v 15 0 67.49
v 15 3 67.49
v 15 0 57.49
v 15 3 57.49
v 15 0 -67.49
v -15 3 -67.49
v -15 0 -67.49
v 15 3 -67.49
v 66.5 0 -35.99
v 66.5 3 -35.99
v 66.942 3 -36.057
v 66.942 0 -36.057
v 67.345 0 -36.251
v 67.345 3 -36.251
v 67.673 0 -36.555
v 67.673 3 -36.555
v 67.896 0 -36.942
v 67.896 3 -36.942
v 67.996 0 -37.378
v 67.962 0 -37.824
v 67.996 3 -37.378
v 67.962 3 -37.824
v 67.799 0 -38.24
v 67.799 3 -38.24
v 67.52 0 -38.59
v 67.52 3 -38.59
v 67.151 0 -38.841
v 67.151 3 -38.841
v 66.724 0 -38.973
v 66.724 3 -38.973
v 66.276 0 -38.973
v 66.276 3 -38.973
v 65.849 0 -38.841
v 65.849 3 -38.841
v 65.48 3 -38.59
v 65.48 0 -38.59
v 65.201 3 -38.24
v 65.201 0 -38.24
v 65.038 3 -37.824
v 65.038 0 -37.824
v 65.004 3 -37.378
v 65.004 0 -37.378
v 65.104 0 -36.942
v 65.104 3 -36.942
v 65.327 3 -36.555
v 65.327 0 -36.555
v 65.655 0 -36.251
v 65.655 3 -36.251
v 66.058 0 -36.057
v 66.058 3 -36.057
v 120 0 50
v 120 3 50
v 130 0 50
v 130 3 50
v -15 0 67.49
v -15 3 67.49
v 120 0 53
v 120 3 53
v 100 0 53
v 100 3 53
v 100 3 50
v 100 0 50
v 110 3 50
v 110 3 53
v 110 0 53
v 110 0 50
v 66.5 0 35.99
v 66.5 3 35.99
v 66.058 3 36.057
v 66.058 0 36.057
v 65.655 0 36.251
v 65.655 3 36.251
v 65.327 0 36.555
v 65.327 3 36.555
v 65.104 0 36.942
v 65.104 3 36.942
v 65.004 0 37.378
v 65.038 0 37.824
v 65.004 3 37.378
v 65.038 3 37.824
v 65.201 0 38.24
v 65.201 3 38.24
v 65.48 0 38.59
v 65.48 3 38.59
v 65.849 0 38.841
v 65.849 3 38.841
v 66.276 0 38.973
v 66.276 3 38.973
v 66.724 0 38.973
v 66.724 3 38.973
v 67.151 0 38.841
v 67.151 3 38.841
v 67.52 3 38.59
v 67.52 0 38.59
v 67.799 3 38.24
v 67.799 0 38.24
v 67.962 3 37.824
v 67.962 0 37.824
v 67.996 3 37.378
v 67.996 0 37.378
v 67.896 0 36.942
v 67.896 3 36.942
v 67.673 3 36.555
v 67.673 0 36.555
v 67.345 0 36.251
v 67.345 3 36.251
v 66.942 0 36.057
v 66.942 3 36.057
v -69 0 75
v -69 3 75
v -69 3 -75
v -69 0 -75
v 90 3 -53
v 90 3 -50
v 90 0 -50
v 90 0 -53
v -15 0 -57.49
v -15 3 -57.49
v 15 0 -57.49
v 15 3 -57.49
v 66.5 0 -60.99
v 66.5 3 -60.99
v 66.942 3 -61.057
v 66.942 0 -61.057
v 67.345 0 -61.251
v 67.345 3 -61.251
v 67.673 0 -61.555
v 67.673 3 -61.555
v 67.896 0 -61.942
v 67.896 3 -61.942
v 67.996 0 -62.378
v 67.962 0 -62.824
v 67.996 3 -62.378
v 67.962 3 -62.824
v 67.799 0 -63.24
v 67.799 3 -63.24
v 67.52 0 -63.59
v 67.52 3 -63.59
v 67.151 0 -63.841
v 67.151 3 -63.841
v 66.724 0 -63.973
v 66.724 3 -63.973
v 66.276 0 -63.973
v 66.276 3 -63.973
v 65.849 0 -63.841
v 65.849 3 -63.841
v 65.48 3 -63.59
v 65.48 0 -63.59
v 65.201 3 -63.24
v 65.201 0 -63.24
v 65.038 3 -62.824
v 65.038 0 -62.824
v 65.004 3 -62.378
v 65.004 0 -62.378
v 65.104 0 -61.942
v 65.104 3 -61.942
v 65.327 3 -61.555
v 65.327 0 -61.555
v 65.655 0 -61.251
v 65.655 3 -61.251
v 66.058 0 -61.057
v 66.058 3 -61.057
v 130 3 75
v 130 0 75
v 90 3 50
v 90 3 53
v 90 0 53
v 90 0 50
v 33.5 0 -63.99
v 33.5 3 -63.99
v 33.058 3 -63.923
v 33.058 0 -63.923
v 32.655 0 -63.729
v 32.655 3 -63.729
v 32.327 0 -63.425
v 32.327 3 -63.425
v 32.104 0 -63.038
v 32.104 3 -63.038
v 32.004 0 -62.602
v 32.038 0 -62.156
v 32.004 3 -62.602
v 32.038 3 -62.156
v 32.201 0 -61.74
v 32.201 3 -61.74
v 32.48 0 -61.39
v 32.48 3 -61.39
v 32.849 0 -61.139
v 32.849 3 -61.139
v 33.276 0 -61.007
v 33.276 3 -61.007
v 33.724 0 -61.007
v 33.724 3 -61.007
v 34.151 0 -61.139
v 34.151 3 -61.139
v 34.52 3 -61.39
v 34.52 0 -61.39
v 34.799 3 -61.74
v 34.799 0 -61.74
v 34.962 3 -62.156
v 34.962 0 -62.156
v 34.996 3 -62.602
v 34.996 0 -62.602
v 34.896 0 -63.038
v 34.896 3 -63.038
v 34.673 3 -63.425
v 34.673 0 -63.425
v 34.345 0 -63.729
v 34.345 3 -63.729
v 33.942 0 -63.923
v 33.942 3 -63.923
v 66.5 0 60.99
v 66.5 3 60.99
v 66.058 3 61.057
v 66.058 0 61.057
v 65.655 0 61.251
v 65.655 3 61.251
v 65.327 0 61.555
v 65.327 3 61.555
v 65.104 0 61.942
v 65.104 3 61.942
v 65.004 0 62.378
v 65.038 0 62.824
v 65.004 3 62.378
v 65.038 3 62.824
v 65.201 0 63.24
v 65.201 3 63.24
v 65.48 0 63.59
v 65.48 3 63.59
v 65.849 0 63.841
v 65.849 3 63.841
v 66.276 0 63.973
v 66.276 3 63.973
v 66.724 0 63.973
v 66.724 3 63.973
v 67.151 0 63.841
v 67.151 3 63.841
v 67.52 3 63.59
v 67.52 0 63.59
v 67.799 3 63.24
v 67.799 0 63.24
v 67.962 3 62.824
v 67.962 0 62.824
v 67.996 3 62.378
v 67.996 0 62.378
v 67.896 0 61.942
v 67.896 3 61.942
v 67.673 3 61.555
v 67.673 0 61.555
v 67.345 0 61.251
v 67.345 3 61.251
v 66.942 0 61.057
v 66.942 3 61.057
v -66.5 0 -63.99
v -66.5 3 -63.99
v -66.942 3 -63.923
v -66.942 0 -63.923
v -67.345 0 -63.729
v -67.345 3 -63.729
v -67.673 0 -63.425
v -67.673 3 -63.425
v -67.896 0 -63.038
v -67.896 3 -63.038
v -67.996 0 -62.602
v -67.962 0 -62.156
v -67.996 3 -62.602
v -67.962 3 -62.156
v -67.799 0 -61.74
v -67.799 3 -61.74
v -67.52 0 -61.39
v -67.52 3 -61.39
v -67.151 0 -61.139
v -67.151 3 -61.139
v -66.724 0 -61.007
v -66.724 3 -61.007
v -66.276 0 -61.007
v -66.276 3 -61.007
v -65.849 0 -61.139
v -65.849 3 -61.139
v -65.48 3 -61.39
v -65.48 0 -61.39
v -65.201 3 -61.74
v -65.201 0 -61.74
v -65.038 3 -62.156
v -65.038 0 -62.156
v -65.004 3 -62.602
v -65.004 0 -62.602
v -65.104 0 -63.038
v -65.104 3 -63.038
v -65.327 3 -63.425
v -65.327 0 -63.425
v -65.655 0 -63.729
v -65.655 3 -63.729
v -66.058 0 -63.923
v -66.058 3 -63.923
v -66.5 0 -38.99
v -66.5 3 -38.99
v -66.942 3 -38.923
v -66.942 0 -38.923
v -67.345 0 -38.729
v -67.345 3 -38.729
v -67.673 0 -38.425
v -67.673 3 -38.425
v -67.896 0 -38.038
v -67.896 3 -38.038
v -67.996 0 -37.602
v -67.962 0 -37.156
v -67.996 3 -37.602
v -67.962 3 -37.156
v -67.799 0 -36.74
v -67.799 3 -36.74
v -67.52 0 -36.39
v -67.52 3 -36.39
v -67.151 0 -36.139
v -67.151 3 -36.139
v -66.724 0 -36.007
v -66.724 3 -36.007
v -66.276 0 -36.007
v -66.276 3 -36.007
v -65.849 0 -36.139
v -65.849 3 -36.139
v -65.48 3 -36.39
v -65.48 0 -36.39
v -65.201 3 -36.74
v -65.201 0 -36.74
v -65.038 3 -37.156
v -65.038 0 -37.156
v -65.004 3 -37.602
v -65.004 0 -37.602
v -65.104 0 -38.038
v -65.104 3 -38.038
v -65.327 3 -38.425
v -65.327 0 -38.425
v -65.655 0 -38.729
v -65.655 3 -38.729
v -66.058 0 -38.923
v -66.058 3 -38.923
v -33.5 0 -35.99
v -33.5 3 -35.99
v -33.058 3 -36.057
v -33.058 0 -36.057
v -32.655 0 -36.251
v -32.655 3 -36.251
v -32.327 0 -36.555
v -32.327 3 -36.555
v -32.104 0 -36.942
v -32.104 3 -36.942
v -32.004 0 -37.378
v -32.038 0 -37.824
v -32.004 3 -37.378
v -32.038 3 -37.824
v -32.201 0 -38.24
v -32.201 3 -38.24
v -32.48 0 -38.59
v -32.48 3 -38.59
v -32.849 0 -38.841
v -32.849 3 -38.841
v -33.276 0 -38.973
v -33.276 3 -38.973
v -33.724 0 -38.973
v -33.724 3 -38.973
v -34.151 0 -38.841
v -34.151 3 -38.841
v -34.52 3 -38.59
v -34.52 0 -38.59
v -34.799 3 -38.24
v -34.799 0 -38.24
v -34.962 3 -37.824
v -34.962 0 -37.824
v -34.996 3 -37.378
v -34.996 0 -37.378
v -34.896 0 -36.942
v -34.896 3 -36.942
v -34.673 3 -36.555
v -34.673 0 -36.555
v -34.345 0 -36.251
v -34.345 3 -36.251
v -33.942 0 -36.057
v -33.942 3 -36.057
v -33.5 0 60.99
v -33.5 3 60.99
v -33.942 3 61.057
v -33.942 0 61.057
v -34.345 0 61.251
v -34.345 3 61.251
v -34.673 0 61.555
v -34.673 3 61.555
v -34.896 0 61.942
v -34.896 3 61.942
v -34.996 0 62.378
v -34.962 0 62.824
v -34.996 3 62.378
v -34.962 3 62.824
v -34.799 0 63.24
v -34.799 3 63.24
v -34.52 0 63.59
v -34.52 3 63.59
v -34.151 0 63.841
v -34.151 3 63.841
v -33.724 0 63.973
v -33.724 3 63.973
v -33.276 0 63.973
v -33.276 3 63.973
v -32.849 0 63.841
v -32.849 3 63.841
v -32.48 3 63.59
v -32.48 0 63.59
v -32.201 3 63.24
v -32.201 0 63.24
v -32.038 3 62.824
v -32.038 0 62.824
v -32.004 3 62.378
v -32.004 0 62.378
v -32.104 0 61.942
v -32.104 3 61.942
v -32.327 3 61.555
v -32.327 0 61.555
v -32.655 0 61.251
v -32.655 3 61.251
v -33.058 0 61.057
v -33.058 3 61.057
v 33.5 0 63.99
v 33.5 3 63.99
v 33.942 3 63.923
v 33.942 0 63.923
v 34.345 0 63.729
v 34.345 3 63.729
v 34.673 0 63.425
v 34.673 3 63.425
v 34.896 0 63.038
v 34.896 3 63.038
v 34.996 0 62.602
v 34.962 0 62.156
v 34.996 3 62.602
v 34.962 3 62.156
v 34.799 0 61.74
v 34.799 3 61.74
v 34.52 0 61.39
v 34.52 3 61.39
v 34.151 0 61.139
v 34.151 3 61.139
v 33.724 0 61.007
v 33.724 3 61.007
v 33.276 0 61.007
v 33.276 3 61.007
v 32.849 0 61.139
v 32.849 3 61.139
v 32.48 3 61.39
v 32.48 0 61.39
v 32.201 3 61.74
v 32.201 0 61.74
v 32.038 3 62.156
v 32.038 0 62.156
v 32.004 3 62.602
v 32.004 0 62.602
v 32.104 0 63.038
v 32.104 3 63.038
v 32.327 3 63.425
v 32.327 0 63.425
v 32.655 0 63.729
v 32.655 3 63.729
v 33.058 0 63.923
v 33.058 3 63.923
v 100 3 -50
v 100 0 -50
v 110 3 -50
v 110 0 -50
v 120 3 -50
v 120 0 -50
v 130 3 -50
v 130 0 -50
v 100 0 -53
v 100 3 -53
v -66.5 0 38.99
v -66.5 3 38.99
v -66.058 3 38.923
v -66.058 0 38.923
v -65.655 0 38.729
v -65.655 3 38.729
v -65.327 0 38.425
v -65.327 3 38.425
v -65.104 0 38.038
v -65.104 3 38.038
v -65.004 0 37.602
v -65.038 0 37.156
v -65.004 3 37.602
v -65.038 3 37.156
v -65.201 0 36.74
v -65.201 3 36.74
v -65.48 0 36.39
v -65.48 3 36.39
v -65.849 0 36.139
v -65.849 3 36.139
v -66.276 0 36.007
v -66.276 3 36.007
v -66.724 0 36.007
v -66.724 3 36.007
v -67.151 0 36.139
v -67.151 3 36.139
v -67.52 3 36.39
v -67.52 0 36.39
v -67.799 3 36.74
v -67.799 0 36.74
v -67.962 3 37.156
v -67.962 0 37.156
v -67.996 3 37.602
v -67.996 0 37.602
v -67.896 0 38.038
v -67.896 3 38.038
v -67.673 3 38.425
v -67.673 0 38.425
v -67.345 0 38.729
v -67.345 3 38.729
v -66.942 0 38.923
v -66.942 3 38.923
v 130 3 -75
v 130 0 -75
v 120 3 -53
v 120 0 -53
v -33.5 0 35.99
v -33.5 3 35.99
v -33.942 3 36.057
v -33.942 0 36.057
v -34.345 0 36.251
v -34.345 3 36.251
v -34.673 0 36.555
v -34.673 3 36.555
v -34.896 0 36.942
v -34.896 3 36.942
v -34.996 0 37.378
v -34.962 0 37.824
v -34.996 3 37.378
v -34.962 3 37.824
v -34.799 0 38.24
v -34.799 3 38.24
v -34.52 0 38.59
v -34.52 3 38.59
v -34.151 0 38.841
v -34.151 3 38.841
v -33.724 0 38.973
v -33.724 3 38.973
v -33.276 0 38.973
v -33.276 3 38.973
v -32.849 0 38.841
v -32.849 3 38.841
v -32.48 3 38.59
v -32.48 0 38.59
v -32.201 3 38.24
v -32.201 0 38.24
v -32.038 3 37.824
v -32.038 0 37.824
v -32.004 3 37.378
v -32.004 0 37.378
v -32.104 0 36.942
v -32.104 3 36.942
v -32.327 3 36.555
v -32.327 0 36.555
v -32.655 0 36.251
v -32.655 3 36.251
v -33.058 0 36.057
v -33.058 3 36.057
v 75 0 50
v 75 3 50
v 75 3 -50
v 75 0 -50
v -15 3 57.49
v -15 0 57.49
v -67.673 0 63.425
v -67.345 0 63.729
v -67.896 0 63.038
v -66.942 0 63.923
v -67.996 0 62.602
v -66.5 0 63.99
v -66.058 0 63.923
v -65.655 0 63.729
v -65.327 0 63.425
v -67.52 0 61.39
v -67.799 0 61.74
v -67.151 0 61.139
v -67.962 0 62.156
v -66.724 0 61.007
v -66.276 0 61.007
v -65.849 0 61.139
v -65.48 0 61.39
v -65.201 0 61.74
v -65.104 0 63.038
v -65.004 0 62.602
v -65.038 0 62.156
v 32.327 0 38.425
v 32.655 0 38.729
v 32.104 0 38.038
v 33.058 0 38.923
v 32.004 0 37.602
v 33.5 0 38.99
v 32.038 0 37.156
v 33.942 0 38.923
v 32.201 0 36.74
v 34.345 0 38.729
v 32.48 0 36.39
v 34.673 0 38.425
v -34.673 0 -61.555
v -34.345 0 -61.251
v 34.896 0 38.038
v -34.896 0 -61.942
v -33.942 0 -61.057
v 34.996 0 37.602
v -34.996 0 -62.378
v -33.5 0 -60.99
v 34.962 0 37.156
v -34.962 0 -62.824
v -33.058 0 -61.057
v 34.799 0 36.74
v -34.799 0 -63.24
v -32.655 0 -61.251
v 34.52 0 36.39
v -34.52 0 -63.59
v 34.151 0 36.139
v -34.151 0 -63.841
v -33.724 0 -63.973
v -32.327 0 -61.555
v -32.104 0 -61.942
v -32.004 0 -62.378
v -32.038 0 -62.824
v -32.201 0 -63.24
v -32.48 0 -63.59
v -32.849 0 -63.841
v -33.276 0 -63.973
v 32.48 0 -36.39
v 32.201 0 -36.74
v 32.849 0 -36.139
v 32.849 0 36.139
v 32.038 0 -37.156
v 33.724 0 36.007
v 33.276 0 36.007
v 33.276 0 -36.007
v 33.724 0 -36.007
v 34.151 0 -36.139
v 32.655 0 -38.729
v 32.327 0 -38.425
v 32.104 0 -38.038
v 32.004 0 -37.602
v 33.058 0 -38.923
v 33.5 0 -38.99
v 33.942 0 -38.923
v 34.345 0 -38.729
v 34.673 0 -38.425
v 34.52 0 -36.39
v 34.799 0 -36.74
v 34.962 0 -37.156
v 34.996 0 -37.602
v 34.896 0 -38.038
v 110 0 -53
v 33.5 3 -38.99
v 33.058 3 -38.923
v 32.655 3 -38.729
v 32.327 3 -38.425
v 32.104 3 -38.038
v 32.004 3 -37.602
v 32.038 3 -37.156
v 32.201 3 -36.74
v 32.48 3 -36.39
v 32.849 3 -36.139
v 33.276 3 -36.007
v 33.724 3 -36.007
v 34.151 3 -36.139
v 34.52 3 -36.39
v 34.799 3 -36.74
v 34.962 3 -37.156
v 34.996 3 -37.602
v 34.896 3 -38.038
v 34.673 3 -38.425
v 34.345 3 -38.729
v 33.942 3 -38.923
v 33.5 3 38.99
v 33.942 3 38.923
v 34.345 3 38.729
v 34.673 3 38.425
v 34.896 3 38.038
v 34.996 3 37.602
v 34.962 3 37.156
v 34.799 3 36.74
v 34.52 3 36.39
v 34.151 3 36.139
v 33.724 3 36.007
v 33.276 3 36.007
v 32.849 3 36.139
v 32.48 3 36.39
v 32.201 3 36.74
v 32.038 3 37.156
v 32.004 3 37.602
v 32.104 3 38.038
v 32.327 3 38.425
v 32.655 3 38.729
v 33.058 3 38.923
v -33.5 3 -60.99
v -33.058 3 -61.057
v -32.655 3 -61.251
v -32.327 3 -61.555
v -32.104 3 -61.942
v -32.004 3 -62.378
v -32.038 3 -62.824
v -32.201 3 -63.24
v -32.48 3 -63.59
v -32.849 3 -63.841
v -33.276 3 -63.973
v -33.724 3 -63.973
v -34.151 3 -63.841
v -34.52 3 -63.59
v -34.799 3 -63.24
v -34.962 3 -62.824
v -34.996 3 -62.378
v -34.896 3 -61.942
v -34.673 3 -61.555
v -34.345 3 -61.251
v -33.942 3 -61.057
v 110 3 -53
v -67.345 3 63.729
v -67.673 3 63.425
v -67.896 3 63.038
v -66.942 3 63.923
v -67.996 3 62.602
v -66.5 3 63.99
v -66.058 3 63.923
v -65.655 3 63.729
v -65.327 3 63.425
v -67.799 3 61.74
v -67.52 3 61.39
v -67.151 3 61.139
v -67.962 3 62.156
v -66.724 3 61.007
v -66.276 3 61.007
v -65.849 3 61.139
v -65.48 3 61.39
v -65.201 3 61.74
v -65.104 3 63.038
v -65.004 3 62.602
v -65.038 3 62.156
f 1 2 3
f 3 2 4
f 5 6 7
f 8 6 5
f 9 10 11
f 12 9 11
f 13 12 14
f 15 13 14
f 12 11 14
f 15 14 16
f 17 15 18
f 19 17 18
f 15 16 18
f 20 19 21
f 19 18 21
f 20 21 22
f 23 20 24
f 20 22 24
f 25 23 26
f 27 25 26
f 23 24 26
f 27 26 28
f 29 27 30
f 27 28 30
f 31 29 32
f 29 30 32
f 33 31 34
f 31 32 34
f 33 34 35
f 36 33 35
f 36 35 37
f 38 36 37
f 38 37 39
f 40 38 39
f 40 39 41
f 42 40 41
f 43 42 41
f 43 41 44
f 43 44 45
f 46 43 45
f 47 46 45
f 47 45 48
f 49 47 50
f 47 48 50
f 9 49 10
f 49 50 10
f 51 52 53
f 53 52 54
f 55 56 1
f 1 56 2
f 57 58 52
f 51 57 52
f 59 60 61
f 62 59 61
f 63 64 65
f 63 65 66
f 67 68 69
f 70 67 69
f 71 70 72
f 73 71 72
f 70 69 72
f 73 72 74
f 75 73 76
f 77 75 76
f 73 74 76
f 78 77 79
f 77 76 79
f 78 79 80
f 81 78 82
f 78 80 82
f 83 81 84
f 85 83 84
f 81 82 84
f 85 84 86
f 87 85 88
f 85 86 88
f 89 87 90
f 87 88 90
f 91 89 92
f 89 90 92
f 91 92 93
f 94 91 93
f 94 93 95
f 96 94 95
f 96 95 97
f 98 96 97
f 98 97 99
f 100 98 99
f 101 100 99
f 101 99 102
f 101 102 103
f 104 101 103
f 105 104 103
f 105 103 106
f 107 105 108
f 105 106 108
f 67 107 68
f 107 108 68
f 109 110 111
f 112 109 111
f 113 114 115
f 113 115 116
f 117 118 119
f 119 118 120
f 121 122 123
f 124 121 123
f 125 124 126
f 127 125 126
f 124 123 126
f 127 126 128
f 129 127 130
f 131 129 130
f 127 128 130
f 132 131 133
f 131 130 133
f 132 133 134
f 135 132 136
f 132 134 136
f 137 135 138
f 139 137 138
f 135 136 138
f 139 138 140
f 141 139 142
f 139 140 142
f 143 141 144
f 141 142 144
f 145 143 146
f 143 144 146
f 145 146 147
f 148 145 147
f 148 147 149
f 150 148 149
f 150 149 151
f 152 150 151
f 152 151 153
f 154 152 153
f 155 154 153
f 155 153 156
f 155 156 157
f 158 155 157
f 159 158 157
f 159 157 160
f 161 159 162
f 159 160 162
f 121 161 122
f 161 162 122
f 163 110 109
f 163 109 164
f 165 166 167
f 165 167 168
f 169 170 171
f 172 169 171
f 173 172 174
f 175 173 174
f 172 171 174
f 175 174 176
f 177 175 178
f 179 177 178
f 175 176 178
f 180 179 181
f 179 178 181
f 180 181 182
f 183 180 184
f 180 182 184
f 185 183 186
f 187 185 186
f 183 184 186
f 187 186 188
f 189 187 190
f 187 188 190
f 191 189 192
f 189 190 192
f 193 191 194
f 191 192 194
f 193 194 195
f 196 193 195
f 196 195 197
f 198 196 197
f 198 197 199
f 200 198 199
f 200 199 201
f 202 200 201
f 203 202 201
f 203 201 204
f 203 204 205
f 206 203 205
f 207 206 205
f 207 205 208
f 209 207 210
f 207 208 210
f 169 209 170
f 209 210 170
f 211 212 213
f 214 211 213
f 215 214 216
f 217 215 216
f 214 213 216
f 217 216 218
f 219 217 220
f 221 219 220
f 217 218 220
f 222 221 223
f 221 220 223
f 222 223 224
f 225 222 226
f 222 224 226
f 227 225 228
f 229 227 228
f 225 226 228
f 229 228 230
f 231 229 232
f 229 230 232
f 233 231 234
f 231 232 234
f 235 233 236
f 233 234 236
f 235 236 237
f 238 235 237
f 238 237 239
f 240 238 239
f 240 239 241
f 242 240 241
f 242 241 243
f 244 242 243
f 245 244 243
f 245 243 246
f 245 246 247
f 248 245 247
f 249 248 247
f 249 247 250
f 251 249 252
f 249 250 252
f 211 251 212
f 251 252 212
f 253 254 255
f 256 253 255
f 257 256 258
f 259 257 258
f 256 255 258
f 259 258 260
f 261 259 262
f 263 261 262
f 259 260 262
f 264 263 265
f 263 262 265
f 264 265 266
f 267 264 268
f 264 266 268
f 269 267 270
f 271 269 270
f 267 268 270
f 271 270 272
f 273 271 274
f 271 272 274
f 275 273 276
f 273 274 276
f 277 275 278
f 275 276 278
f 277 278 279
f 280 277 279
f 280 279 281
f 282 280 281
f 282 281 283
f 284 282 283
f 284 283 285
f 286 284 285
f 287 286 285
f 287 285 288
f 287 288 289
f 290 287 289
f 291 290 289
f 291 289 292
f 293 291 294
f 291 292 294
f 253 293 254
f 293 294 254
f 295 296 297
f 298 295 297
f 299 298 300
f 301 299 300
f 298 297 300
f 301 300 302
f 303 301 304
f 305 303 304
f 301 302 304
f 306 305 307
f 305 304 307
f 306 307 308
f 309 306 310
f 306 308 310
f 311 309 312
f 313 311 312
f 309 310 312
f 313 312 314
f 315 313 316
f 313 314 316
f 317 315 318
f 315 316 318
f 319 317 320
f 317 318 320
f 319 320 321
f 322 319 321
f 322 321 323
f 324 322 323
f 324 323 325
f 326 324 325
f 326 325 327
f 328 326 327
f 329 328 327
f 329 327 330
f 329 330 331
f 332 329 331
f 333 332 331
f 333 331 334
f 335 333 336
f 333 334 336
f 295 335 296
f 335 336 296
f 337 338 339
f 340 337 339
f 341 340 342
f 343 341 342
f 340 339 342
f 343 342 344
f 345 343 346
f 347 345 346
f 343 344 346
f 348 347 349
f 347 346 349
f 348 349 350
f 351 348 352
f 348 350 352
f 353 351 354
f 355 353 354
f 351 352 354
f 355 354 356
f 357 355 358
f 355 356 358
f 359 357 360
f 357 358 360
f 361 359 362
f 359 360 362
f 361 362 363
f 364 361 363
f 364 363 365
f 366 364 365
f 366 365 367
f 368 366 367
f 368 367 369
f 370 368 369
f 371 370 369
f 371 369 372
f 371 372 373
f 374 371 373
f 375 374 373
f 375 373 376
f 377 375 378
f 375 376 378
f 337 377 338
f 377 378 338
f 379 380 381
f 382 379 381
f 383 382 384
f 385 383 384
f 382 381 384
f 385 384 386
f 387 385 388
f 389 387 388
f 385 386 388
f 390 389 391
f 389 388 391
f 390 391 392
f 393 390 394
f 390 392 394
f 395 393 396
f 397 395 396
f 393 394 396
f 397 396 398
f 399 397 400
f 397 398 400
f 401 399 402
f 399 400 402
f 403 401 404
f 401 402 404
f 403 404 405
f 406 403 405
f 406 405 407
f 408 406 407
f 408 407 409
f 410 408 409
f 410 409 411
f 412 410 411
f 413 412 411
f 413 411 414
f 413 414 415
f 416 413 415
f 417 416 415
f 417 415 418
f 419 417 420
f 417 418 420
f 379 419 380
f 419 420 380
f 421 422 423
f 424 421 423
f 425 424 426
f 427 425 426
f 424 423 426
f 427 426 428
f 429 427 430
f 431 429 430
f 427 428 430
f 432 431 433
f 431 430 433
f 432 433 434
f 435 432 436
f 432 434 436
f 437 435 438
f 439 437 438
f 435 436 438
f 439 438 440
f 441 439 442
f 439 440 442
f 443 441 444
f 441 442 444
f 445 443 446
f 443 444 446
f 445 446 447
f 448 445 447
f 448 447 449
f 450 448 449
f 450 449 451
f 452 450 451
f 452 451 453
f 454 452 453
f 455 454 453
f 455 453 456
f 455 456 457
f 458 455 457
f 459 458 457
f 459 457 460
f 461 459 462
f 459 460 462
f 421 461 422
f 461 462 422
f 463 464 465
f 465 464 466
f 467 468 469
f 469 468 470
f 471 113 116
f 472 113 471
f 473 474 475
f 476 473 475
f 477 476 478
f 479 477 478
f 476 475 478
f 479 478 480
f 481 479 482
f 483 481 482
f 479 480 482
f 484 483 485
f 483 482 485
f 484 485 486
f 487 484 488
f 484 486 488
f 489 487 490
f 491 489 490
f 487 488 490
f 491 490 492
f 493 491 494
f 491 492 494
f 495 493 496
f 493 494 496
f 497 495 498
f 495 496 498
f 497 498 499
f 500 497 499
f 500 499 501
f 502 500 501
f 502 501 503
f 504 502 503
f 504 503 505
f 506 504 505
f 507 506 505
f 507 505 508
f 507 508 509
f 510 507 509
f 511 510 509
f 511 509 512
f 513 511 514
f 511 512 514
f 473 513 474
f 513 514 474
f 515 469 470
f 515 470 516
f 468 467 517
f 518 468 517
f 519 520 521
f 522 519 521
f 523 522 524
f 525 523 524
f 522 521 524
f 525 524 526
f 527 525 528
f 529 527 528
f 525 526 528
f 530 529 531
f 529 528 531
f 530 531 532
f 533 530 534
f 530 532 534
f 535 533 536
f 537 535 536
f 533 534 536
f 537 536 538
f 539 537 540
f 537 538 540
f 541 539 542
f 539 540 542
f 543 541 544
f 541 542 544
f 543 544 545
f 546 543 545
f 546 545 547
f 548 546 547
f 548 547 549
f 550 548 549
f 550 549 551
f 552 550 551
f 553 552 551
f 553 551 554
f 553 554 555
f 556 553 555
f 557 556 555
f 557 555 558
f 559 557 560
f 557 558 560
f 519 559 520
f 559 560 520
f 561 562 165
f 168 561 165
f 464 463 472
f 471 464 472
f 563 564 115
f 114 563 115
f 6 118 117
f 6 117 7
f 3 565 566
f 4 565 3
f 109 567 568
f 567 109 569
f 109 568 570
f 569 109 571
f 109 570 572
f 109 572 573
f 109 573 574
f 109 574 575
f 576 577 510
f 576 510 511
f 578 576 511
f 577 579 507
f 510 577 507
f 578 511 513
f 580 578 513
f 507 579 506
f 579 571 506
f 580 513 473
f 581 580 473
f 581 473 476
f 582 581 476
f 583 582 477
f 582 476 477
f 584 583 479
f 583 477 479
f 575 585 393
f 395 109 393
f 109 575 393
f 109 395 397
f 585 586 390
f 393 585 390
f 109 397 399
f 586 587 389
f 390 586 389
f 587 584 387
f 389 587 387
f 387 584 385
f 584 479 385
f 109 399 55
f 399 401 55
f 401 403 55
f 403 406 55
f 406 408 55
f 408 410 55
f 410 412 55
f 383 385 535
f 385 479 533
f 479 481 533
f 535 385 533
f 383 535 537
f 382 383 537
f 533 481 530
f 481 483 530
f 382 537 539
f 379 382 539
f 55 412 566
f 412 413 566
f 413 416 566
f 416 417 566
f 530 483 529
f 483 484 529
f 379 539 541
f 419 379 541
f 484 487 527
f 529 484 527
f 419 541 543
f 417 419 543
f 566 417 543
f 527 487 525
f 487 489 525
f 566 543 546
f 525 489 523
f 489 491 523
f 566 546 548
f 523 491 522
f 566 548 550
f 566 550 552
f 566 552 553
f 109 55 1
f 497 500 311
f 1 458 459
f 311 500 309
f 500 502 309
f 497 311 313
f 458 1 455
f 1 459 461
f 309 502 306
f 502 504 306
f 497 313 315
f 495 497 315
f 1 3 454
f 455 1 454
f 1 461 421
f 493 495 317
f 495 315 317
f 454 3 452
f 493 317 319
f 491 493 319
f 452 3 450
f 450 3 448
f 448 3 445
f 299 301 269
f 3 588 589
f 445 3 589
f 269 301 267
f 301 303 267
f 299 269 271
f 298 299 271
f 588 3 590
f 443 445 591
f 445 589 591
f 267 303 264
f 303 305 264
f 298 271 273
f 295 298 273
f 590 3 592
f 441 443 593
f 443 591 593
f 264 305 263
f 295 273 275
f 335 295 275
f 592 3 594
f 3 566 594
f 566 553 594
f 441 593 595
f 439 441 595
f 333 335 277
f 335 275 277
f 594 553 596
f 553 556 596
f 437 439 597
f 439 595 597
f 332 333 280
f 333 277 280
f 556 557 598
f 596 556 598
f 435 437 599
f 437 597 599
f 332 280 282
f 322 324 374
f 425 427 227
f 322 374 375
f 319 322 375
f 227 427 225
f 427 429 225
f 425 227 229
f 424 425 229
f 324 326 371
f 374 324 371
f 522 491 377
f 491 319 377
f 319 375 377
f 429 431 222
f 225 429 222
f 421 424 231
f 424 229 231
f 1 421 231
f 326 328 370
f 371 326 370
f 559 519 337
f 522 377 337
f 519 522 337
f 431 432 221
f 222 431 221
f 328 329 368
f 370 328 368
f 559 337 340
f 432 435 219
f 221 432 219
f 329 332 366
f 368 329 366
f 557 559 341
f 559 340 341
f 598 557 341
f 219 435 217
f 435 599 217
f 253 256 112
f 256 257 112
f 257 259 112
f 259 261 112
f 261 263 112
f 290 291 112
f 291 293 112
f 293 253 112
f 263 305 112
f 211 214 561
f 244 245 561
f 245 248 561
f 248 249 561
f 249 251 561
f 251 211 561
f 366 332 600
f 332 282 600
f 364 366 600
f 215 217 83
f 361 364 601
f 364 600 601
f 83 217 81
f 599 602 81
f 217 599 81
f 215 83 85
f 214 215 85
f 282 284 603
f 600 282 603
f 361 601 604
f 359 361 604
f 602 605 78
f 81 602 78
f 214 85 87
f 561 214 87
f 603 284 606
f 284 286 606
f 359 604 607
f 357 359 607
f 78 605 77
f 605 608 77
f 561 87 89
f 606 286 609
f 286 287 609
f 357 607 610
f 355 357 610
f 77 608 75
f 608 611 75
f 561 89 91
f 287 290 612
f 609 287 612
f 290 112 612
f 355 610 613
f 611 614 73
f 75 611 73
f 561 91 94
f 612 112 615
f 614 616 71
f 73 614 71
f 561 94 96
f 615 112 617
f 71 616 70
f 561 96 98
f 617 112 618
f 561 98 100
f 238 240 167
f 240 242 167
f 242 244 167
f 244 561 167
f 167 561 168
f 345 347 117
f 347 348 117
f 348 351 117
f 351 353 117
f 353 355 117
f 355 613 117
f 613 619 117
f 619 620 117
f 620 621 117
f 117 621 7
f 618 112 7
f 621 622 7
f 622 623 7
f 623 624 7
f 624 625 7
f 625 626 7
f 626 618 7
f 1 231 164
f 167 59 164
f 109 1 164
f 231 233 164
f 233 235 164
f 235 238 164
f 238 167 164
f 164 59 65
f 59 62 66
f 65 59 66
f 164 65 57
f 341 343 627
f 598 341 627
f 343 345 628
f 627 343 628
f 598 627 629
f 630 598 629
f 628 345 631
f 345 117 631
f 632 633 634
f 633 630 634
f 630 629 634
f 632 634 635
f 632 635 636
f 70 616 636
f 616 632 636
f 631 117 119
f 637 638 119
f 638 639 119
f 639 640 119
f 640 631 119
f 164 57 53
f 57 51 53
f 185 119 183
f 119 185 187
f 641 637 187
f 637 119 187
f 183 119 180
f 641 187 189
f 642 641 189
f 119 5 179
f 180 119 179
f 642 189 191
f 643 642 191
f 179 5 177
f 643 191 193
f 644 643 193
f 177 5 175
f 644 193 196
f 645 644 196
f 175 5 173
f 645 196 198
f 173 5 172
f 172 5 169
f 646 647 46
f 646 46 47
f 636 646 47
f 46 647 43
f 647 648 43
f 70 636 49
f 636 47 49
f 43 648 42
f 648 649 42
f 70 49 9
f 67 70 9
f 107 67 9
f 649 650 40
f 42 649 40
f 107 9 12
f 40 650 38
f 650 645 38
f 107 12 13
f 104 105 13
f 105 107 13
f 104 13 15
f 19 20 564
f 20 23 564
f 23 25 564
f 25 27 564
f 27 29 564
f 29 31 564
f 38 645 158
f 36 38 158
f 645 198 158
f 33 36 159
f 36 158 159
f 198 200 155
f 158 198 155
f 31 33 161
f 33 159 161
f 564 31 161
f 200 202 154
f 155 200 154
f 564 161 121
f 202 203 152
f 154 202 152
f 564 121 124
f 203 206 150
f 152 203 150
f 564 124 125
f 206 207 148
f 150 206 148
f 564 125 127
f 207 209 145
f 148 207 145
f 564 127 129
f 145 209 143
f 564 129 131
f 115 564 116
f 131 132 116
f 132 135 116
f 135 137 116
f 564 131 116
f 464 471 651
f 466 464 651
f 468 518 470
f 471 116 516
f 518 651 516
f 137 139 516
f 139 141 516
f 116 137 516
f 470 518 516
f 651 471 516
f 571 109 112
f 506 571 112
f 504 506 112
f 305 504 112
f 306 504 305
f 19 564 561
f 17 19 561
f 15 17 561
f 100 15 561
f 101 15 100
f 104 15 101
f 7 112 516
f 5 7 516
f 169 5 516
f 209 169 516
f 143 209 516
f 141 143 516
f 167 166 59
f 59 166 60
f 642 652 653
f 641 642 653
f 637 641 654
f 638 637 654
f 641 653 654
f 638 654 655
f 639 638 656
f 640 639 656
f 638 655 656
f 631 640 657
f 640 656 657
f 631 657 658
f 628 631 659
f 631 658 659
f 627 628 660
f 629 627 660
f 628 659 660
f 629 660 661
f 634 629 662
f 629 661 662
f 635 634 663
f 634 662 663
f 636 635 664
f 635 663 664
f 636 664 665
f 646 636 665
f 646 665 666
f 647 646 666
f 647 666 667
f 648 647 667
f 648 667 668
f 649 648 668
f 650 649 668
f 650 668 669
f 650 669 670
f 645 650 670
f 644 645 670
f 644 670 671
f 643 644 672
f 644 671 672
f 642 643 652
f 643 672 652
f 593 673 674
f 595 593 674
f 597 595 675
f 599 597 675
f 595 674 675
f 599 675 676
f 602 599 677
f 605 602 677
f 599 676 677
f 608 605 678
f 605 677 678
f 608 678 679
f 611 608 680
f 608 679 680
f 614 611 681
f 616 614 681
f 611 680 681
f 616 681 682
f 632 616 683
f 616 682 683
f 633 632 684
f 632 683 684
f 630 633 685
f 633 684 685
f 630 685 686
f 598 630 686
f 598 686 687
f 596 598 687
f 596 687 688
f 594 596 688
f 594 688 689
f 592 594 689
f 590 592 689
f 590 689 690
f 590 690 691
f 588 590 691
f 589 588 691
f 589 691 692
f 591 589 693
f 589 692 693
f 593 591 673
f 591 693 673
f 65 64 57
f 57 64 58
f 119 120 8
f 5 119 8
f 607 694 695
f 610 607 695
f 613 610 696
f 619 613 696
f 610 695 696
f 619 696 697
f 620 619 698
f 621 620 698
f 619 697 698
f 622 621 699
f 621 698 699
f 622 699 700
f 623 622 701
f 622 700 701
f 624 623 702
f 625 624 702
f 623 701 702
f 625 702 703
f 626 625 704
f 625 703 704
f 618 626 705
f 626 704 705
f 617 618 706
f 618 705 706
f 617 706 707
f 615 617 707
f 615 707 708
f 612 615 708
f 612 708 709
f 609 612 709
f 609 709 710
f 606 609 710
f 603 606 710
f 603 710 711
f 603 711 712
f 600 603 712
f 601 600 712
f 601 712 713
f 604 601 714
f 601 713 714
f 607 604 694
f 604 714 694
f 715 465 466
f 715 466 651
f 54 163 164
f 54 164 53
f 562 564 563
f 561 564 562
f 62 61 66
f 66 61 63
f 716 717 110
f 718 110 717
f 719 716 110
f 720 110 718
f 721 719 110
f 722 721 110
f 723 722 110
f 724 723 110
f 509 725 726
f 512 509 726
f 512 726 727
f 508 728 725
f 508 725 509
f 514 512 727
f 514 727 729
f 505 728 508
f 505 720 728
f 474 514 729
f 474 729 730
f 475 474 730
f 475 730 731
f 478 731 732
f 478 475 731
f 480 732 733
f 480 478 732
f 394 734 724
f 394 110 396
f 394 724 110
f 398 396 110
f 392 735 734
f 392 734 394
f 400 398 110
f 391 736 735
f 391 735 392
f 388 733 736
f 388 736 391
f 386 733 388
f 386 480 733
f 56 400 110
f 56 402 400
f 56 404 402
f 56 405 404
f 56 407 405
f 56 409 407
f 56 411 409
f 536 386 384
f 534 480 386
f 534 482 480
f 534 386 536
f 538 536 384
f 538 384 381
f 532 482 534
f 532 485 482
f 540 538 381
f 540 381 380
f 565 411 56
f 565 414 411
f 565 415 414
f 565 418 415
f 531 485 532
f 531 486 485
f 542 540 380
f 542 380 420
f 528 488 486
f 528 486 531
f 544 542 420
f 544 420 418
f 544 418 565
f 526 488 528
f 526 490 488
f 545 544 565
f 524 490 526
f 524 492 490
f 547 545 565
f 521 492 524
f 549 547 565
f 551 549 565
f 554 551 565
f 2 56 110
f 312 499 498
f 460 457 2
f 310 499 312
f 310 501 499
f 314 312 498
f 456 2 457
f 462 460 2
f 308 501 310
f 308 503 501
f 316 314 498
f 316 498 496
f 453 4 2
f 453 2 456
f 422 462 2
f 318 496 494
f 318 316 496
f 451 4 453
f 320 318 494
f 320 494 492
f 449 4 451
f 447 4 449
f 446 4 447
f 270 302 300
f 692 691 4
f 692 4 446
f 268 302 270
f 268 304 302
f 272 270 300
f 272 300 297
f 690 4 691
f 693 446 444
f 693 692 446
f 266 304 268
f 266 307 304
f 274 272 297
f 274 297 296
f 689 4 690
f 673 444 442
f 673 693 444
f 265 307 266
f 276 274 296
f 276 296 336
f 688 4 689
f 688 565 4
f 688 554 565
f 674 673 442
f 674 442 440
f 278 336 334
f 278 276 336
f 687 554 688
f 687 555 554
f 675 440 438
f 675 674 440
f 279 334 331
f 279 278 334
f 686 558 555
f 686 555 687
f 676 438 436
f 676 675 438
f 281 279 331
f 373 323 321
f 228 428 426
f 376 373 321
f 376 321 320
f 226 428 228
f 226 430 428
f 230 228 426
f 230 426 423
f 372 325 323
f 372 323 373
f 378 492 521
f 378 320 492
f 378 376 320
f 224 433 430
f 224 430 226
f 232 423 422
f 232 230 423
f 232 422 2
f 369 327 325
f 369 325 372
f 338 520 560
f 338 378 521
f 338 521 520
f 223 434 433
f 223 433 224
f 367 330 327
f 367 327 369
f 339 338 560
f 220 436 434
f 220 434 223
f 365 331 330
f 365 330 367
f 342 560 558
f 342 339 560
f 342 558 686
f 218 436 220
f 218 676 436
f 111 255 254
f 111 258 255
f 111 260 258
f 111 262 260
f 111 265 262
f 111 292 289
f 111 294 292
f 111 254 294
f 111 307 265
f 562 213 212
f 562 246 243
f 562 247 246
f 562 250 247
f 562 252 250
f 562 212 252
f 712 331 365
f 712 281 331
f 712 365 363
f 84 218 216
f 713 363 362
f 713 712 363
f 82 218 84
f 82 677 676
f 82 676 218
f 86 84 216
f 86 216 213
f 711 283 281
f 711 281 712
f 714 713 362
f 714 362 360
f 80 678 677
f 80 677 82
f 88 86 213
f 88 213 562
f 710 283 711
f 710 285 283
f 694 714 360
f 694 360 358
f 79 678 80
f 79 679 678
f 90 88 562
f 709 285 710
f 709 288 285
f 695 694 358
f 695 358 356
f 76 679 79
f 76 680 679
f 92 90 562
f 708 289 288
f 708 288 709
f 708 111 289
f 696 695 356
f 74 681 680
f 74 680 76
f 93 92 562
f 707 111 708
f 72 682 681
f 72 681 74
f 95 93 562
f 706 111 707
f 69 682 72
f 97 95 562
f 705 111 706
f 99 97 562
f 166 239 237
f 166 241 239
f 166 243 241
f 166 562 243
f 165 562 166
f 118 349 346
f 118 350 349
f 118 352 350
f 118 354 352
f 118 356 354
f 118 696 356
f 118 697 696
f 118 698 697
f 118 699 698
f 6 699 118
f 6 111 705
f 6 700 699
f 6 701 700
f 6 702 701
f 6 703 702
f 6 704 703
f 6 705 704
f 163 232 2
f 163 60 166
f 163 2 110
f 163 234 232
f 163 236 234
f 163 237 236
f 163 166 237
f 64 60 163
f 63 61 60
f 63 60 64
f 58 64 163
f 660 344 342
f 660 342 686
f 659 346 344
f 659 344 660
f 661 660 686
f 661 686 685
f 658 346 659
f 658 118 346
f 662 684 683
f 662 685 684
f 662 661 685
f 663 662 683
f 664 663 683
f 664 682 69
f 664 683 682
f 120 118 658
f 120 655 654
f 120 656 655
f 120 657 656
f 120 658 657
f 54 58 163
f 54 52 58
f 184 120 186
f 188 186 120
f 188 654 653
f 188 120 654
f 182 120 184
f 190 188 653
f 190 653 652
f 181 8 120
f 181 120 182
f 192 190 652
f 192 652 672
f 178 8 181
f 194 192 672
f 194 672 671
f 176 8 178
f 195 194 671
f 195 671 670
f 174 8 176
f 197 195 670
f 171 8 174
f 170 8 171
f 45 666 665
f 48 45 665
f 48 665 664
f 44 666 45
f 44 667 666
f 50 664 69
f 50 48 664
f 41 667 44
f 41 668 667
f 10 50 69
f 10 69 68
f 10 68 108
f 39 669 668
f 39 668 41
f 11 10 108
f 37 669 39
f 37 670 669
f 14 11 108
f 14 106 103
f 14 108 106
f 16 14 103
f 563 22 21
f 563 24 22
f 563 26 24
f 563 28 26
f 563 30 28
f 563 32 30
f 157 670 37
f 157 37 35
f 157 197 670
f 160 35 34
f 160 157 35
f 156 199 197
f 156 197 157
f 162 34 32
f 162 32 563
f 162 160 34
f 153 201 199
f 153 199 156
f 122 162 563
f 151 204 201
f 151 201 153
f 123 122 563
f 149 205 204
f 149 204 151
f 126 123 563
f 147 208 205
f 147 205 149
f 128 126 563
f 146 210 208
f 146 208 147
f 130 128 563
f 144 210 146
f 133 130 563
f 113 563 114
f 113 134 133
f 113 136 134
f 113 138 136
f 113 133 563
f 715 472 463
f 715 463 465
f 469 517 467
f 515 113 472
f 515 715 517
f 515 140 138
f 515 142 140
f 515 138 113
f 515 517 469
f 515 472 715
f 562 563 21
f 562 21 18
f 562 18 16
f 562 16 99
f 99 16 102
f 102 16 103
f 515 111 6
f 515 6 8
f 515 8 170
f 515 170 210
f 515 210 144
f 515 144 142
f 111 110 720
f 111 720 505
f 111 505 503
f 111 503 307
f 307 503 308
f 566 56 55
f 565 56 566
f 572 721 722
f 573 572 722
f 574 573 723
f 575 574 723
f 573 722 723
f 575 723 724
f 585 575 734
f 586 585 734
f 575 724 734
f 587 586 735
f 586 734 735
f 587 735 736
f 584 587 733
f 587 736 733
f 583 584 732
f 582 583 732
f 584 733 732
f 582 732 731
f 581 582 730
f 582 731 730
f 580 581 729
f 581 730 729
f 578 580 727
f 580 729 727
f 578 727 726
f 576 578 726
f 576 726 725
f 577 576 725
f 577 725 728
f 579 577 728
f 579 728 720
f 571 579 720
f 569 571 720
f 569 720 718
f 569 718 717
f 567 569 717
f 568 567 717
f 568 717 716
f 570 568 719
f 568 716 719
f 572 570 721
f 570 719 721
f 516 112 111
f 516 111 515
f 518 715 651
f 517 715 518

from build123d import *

# Parameters (mm, degrees)
SKETCH2_W           = 180
SKETCH2_H           = 150
BOSS_EXTRUDE1_DEPTH = 3
SKETCH4_R           = 1.5
CUT_EXTRUDE1_DEPTH  = 3
SKETCH5_W           = 30
SKETCH5_H           = 100
CUT_EXTRUDE2_DEPTH  = 3
SKETCH7_W           = 40
SKETCH7_H           = 25
BOSS_EXTRUDE4_DEPTH = 3
SKETCH8_W           = 10
SKETCH8_H           = 3
CUT_EXTRUDE4_DEPTH  = 10
SKETCH9_W           = 21
SKETCH9_H           = 150
CUT_EXTRUDE5_DEPTH  = 10
SKETCH10_W          = 30
SKETCH10_H          = 10
CUT_EXTRUDE6_DEPTH  = 10


with BuildPart() as part:
    # Sketch2 → Boss-Extrude1 (new body)
    with BuildSketch(Plane(origin=(0, 0, 0), x_dir=(1, 0, 0), z_dir=(0, 1, 0))):
        Rectangle(SKETCH2_W, SKETCH2_H)
    extrude(amount=BOSS_EXTRUDE1_DEPTH)

    # Sketch4 → Cut-Extrude1 (cut)
    with BuildSketch(Plane(origin=(0, 3, 0), x_dir=(1, 0, 0), z_dir=(0, 1, 0))):
        with Locations(Location((-66.5, -62.49, 0), (0, 0, 270))):
            Circle(SKETCH4_R)
        with Locations(Location((-66.5, -37.49, 0), (0, 0, 270))):
            Circle(SKETCH4_R)
        with Locations(Location((-33.5, -62.49, 0), (0, 0, 90))):
            Circle(SKETCH4_R)
        with Locations(Location((-33.5, -37.49, 0), (0, 0, 90))):
            Circle(SKETCH4_R)
        with Locations(Location((-66.5, 62.49, 0), (0, 0, 90))):
            Circle(SKETCH4_R)
        with Locations(Location((-66.5, 37.49, 0), (0, 0, 90))):
            Circle(SKETCH4_R)
        with Locations(Location((-33.5, 62.49, 0), (0, 0, 270))):
            Circle(SKETCH4_R)
        with Locations(Location((-33.5, 37.49, 0), (0, 0, 270))):
            Circle(SKETCH4_R)
        with Locations(Location((66.5, -62.49, 0), (0, 0, 90))):
            Circle(SKETCH4_R)
        with Locations(Location((33.5, -62.49, 0), (0, 0, 270))):
            Circle(SKETCH4_R)
        with Locations(Location((33.5, -37.49, 0), (0, 0, 270))):
            Circle(SKETCH4_R)
        with Locations(Location((66.5, -37.49, 0), (0, 0, 90))):
            Circle(SKETCH4_R)
        with Locations(Location((66.5, 37.49, 0), (0, 0, 270))):
            Circle(SKETCH4_R)
        with Locations(Location((66.5, 62.49, 0), (0, 0, 270))):
            Circle(SKETCH4_R)
        with Locations(Location((33.5, 62.49, 0), (0, 0, 90))):
            Circle(SKETCH4_R)
        with Locations(Location((33.5, 37.49, 0), (0, 0, 90))):
            Circle(SKETCH4_R)
    extrude(amount=-CUT_EXTRUDE1_DEPTH, mode=Mode.SUBTRACT)

    # Sketch5 → Cut-Extrude2 (cut)
    with BuildSketch(Plane.XZ):
        with Locations((90, 0)):
            Rectangle(SKETCH5_W, SKETCH5_H)
    extrude(amount=-CUT_EXTRUDE2_DEPTH, mode=Mode.SUBTRACT)

    # Sketch7 → Boss-Extrude4 (add)
    with BuildSketch(Plane(origin=(0, 3, 0), x_dir=(1, 0, 0), z_dir=(0, 1, 0))):
        with Locations((110, -62.5)):
            Rectangle(SKETCH7_W, SKETCH7_H)
        with Locations((110, 62.5)):
            Rectangle(SKETCH7_W, SKETCH7_H)
    extrude(amount=-BOSS_EXTRUDE4_DEPTH)

    # Sketch8 → Cut-Extrude4 (cut)
    with BuildSketch(Plane(origin=(0, 3, 0), x_dir=(1, 0, 0), z_dir=(0, 1, 0))):
        with Locations((115, 51.5)):
            Rectangle(SKETCH8_W, SKETCH8_H)
        with Locations((95, 51.5)):
            Rectangle(SKETCH8_W, SKETCH8_H)
        with Locations((115, -51.5)):
            Rectangle(SKETCH8_W, SKETCH8_H)
        with Locations((95, -51.5)):
            Rectangle(SKETCH8_W, SKETCH8_H)
    extrude(amount=-CUT_EXTRUDE4_DEPTH, mode=Mode.SUBTRACT)

    # Sketch9 → Cut-Extrude5 (cut)
    with BuildSketch(Plane(origin=(0, 3, 0), x_dir=(1, 0, 0), z_dir=(0, 1, 0))):
        with Locations((-79.5, 0)):
            Rectangle(SKETCH9_W, SKETCH9_H)
    extrude(amount=-CUT_EXTRUDE5_DEPTH, mode=Mode.SUBTRACT)

    # Sketch10 → Cut-Extrude6 (cut)
    with BuildSketch(Plane(origin=(0, 3, 0), x_dir=(1, 0, 0), z_dir=(0, 1, 0))):
        with Locations((0, -62.49)):
            Rectangle(SKETCH10_W, SKETCH10_H)
        with Locations((0, 62.49)):
            Rectangle(SKETCH10_W, SKETCH10_H)
    extrude(amount=-CUT_EXTRUDE6_DEPTH, mode=Mode.SUBTRACT)


solid = part.part
